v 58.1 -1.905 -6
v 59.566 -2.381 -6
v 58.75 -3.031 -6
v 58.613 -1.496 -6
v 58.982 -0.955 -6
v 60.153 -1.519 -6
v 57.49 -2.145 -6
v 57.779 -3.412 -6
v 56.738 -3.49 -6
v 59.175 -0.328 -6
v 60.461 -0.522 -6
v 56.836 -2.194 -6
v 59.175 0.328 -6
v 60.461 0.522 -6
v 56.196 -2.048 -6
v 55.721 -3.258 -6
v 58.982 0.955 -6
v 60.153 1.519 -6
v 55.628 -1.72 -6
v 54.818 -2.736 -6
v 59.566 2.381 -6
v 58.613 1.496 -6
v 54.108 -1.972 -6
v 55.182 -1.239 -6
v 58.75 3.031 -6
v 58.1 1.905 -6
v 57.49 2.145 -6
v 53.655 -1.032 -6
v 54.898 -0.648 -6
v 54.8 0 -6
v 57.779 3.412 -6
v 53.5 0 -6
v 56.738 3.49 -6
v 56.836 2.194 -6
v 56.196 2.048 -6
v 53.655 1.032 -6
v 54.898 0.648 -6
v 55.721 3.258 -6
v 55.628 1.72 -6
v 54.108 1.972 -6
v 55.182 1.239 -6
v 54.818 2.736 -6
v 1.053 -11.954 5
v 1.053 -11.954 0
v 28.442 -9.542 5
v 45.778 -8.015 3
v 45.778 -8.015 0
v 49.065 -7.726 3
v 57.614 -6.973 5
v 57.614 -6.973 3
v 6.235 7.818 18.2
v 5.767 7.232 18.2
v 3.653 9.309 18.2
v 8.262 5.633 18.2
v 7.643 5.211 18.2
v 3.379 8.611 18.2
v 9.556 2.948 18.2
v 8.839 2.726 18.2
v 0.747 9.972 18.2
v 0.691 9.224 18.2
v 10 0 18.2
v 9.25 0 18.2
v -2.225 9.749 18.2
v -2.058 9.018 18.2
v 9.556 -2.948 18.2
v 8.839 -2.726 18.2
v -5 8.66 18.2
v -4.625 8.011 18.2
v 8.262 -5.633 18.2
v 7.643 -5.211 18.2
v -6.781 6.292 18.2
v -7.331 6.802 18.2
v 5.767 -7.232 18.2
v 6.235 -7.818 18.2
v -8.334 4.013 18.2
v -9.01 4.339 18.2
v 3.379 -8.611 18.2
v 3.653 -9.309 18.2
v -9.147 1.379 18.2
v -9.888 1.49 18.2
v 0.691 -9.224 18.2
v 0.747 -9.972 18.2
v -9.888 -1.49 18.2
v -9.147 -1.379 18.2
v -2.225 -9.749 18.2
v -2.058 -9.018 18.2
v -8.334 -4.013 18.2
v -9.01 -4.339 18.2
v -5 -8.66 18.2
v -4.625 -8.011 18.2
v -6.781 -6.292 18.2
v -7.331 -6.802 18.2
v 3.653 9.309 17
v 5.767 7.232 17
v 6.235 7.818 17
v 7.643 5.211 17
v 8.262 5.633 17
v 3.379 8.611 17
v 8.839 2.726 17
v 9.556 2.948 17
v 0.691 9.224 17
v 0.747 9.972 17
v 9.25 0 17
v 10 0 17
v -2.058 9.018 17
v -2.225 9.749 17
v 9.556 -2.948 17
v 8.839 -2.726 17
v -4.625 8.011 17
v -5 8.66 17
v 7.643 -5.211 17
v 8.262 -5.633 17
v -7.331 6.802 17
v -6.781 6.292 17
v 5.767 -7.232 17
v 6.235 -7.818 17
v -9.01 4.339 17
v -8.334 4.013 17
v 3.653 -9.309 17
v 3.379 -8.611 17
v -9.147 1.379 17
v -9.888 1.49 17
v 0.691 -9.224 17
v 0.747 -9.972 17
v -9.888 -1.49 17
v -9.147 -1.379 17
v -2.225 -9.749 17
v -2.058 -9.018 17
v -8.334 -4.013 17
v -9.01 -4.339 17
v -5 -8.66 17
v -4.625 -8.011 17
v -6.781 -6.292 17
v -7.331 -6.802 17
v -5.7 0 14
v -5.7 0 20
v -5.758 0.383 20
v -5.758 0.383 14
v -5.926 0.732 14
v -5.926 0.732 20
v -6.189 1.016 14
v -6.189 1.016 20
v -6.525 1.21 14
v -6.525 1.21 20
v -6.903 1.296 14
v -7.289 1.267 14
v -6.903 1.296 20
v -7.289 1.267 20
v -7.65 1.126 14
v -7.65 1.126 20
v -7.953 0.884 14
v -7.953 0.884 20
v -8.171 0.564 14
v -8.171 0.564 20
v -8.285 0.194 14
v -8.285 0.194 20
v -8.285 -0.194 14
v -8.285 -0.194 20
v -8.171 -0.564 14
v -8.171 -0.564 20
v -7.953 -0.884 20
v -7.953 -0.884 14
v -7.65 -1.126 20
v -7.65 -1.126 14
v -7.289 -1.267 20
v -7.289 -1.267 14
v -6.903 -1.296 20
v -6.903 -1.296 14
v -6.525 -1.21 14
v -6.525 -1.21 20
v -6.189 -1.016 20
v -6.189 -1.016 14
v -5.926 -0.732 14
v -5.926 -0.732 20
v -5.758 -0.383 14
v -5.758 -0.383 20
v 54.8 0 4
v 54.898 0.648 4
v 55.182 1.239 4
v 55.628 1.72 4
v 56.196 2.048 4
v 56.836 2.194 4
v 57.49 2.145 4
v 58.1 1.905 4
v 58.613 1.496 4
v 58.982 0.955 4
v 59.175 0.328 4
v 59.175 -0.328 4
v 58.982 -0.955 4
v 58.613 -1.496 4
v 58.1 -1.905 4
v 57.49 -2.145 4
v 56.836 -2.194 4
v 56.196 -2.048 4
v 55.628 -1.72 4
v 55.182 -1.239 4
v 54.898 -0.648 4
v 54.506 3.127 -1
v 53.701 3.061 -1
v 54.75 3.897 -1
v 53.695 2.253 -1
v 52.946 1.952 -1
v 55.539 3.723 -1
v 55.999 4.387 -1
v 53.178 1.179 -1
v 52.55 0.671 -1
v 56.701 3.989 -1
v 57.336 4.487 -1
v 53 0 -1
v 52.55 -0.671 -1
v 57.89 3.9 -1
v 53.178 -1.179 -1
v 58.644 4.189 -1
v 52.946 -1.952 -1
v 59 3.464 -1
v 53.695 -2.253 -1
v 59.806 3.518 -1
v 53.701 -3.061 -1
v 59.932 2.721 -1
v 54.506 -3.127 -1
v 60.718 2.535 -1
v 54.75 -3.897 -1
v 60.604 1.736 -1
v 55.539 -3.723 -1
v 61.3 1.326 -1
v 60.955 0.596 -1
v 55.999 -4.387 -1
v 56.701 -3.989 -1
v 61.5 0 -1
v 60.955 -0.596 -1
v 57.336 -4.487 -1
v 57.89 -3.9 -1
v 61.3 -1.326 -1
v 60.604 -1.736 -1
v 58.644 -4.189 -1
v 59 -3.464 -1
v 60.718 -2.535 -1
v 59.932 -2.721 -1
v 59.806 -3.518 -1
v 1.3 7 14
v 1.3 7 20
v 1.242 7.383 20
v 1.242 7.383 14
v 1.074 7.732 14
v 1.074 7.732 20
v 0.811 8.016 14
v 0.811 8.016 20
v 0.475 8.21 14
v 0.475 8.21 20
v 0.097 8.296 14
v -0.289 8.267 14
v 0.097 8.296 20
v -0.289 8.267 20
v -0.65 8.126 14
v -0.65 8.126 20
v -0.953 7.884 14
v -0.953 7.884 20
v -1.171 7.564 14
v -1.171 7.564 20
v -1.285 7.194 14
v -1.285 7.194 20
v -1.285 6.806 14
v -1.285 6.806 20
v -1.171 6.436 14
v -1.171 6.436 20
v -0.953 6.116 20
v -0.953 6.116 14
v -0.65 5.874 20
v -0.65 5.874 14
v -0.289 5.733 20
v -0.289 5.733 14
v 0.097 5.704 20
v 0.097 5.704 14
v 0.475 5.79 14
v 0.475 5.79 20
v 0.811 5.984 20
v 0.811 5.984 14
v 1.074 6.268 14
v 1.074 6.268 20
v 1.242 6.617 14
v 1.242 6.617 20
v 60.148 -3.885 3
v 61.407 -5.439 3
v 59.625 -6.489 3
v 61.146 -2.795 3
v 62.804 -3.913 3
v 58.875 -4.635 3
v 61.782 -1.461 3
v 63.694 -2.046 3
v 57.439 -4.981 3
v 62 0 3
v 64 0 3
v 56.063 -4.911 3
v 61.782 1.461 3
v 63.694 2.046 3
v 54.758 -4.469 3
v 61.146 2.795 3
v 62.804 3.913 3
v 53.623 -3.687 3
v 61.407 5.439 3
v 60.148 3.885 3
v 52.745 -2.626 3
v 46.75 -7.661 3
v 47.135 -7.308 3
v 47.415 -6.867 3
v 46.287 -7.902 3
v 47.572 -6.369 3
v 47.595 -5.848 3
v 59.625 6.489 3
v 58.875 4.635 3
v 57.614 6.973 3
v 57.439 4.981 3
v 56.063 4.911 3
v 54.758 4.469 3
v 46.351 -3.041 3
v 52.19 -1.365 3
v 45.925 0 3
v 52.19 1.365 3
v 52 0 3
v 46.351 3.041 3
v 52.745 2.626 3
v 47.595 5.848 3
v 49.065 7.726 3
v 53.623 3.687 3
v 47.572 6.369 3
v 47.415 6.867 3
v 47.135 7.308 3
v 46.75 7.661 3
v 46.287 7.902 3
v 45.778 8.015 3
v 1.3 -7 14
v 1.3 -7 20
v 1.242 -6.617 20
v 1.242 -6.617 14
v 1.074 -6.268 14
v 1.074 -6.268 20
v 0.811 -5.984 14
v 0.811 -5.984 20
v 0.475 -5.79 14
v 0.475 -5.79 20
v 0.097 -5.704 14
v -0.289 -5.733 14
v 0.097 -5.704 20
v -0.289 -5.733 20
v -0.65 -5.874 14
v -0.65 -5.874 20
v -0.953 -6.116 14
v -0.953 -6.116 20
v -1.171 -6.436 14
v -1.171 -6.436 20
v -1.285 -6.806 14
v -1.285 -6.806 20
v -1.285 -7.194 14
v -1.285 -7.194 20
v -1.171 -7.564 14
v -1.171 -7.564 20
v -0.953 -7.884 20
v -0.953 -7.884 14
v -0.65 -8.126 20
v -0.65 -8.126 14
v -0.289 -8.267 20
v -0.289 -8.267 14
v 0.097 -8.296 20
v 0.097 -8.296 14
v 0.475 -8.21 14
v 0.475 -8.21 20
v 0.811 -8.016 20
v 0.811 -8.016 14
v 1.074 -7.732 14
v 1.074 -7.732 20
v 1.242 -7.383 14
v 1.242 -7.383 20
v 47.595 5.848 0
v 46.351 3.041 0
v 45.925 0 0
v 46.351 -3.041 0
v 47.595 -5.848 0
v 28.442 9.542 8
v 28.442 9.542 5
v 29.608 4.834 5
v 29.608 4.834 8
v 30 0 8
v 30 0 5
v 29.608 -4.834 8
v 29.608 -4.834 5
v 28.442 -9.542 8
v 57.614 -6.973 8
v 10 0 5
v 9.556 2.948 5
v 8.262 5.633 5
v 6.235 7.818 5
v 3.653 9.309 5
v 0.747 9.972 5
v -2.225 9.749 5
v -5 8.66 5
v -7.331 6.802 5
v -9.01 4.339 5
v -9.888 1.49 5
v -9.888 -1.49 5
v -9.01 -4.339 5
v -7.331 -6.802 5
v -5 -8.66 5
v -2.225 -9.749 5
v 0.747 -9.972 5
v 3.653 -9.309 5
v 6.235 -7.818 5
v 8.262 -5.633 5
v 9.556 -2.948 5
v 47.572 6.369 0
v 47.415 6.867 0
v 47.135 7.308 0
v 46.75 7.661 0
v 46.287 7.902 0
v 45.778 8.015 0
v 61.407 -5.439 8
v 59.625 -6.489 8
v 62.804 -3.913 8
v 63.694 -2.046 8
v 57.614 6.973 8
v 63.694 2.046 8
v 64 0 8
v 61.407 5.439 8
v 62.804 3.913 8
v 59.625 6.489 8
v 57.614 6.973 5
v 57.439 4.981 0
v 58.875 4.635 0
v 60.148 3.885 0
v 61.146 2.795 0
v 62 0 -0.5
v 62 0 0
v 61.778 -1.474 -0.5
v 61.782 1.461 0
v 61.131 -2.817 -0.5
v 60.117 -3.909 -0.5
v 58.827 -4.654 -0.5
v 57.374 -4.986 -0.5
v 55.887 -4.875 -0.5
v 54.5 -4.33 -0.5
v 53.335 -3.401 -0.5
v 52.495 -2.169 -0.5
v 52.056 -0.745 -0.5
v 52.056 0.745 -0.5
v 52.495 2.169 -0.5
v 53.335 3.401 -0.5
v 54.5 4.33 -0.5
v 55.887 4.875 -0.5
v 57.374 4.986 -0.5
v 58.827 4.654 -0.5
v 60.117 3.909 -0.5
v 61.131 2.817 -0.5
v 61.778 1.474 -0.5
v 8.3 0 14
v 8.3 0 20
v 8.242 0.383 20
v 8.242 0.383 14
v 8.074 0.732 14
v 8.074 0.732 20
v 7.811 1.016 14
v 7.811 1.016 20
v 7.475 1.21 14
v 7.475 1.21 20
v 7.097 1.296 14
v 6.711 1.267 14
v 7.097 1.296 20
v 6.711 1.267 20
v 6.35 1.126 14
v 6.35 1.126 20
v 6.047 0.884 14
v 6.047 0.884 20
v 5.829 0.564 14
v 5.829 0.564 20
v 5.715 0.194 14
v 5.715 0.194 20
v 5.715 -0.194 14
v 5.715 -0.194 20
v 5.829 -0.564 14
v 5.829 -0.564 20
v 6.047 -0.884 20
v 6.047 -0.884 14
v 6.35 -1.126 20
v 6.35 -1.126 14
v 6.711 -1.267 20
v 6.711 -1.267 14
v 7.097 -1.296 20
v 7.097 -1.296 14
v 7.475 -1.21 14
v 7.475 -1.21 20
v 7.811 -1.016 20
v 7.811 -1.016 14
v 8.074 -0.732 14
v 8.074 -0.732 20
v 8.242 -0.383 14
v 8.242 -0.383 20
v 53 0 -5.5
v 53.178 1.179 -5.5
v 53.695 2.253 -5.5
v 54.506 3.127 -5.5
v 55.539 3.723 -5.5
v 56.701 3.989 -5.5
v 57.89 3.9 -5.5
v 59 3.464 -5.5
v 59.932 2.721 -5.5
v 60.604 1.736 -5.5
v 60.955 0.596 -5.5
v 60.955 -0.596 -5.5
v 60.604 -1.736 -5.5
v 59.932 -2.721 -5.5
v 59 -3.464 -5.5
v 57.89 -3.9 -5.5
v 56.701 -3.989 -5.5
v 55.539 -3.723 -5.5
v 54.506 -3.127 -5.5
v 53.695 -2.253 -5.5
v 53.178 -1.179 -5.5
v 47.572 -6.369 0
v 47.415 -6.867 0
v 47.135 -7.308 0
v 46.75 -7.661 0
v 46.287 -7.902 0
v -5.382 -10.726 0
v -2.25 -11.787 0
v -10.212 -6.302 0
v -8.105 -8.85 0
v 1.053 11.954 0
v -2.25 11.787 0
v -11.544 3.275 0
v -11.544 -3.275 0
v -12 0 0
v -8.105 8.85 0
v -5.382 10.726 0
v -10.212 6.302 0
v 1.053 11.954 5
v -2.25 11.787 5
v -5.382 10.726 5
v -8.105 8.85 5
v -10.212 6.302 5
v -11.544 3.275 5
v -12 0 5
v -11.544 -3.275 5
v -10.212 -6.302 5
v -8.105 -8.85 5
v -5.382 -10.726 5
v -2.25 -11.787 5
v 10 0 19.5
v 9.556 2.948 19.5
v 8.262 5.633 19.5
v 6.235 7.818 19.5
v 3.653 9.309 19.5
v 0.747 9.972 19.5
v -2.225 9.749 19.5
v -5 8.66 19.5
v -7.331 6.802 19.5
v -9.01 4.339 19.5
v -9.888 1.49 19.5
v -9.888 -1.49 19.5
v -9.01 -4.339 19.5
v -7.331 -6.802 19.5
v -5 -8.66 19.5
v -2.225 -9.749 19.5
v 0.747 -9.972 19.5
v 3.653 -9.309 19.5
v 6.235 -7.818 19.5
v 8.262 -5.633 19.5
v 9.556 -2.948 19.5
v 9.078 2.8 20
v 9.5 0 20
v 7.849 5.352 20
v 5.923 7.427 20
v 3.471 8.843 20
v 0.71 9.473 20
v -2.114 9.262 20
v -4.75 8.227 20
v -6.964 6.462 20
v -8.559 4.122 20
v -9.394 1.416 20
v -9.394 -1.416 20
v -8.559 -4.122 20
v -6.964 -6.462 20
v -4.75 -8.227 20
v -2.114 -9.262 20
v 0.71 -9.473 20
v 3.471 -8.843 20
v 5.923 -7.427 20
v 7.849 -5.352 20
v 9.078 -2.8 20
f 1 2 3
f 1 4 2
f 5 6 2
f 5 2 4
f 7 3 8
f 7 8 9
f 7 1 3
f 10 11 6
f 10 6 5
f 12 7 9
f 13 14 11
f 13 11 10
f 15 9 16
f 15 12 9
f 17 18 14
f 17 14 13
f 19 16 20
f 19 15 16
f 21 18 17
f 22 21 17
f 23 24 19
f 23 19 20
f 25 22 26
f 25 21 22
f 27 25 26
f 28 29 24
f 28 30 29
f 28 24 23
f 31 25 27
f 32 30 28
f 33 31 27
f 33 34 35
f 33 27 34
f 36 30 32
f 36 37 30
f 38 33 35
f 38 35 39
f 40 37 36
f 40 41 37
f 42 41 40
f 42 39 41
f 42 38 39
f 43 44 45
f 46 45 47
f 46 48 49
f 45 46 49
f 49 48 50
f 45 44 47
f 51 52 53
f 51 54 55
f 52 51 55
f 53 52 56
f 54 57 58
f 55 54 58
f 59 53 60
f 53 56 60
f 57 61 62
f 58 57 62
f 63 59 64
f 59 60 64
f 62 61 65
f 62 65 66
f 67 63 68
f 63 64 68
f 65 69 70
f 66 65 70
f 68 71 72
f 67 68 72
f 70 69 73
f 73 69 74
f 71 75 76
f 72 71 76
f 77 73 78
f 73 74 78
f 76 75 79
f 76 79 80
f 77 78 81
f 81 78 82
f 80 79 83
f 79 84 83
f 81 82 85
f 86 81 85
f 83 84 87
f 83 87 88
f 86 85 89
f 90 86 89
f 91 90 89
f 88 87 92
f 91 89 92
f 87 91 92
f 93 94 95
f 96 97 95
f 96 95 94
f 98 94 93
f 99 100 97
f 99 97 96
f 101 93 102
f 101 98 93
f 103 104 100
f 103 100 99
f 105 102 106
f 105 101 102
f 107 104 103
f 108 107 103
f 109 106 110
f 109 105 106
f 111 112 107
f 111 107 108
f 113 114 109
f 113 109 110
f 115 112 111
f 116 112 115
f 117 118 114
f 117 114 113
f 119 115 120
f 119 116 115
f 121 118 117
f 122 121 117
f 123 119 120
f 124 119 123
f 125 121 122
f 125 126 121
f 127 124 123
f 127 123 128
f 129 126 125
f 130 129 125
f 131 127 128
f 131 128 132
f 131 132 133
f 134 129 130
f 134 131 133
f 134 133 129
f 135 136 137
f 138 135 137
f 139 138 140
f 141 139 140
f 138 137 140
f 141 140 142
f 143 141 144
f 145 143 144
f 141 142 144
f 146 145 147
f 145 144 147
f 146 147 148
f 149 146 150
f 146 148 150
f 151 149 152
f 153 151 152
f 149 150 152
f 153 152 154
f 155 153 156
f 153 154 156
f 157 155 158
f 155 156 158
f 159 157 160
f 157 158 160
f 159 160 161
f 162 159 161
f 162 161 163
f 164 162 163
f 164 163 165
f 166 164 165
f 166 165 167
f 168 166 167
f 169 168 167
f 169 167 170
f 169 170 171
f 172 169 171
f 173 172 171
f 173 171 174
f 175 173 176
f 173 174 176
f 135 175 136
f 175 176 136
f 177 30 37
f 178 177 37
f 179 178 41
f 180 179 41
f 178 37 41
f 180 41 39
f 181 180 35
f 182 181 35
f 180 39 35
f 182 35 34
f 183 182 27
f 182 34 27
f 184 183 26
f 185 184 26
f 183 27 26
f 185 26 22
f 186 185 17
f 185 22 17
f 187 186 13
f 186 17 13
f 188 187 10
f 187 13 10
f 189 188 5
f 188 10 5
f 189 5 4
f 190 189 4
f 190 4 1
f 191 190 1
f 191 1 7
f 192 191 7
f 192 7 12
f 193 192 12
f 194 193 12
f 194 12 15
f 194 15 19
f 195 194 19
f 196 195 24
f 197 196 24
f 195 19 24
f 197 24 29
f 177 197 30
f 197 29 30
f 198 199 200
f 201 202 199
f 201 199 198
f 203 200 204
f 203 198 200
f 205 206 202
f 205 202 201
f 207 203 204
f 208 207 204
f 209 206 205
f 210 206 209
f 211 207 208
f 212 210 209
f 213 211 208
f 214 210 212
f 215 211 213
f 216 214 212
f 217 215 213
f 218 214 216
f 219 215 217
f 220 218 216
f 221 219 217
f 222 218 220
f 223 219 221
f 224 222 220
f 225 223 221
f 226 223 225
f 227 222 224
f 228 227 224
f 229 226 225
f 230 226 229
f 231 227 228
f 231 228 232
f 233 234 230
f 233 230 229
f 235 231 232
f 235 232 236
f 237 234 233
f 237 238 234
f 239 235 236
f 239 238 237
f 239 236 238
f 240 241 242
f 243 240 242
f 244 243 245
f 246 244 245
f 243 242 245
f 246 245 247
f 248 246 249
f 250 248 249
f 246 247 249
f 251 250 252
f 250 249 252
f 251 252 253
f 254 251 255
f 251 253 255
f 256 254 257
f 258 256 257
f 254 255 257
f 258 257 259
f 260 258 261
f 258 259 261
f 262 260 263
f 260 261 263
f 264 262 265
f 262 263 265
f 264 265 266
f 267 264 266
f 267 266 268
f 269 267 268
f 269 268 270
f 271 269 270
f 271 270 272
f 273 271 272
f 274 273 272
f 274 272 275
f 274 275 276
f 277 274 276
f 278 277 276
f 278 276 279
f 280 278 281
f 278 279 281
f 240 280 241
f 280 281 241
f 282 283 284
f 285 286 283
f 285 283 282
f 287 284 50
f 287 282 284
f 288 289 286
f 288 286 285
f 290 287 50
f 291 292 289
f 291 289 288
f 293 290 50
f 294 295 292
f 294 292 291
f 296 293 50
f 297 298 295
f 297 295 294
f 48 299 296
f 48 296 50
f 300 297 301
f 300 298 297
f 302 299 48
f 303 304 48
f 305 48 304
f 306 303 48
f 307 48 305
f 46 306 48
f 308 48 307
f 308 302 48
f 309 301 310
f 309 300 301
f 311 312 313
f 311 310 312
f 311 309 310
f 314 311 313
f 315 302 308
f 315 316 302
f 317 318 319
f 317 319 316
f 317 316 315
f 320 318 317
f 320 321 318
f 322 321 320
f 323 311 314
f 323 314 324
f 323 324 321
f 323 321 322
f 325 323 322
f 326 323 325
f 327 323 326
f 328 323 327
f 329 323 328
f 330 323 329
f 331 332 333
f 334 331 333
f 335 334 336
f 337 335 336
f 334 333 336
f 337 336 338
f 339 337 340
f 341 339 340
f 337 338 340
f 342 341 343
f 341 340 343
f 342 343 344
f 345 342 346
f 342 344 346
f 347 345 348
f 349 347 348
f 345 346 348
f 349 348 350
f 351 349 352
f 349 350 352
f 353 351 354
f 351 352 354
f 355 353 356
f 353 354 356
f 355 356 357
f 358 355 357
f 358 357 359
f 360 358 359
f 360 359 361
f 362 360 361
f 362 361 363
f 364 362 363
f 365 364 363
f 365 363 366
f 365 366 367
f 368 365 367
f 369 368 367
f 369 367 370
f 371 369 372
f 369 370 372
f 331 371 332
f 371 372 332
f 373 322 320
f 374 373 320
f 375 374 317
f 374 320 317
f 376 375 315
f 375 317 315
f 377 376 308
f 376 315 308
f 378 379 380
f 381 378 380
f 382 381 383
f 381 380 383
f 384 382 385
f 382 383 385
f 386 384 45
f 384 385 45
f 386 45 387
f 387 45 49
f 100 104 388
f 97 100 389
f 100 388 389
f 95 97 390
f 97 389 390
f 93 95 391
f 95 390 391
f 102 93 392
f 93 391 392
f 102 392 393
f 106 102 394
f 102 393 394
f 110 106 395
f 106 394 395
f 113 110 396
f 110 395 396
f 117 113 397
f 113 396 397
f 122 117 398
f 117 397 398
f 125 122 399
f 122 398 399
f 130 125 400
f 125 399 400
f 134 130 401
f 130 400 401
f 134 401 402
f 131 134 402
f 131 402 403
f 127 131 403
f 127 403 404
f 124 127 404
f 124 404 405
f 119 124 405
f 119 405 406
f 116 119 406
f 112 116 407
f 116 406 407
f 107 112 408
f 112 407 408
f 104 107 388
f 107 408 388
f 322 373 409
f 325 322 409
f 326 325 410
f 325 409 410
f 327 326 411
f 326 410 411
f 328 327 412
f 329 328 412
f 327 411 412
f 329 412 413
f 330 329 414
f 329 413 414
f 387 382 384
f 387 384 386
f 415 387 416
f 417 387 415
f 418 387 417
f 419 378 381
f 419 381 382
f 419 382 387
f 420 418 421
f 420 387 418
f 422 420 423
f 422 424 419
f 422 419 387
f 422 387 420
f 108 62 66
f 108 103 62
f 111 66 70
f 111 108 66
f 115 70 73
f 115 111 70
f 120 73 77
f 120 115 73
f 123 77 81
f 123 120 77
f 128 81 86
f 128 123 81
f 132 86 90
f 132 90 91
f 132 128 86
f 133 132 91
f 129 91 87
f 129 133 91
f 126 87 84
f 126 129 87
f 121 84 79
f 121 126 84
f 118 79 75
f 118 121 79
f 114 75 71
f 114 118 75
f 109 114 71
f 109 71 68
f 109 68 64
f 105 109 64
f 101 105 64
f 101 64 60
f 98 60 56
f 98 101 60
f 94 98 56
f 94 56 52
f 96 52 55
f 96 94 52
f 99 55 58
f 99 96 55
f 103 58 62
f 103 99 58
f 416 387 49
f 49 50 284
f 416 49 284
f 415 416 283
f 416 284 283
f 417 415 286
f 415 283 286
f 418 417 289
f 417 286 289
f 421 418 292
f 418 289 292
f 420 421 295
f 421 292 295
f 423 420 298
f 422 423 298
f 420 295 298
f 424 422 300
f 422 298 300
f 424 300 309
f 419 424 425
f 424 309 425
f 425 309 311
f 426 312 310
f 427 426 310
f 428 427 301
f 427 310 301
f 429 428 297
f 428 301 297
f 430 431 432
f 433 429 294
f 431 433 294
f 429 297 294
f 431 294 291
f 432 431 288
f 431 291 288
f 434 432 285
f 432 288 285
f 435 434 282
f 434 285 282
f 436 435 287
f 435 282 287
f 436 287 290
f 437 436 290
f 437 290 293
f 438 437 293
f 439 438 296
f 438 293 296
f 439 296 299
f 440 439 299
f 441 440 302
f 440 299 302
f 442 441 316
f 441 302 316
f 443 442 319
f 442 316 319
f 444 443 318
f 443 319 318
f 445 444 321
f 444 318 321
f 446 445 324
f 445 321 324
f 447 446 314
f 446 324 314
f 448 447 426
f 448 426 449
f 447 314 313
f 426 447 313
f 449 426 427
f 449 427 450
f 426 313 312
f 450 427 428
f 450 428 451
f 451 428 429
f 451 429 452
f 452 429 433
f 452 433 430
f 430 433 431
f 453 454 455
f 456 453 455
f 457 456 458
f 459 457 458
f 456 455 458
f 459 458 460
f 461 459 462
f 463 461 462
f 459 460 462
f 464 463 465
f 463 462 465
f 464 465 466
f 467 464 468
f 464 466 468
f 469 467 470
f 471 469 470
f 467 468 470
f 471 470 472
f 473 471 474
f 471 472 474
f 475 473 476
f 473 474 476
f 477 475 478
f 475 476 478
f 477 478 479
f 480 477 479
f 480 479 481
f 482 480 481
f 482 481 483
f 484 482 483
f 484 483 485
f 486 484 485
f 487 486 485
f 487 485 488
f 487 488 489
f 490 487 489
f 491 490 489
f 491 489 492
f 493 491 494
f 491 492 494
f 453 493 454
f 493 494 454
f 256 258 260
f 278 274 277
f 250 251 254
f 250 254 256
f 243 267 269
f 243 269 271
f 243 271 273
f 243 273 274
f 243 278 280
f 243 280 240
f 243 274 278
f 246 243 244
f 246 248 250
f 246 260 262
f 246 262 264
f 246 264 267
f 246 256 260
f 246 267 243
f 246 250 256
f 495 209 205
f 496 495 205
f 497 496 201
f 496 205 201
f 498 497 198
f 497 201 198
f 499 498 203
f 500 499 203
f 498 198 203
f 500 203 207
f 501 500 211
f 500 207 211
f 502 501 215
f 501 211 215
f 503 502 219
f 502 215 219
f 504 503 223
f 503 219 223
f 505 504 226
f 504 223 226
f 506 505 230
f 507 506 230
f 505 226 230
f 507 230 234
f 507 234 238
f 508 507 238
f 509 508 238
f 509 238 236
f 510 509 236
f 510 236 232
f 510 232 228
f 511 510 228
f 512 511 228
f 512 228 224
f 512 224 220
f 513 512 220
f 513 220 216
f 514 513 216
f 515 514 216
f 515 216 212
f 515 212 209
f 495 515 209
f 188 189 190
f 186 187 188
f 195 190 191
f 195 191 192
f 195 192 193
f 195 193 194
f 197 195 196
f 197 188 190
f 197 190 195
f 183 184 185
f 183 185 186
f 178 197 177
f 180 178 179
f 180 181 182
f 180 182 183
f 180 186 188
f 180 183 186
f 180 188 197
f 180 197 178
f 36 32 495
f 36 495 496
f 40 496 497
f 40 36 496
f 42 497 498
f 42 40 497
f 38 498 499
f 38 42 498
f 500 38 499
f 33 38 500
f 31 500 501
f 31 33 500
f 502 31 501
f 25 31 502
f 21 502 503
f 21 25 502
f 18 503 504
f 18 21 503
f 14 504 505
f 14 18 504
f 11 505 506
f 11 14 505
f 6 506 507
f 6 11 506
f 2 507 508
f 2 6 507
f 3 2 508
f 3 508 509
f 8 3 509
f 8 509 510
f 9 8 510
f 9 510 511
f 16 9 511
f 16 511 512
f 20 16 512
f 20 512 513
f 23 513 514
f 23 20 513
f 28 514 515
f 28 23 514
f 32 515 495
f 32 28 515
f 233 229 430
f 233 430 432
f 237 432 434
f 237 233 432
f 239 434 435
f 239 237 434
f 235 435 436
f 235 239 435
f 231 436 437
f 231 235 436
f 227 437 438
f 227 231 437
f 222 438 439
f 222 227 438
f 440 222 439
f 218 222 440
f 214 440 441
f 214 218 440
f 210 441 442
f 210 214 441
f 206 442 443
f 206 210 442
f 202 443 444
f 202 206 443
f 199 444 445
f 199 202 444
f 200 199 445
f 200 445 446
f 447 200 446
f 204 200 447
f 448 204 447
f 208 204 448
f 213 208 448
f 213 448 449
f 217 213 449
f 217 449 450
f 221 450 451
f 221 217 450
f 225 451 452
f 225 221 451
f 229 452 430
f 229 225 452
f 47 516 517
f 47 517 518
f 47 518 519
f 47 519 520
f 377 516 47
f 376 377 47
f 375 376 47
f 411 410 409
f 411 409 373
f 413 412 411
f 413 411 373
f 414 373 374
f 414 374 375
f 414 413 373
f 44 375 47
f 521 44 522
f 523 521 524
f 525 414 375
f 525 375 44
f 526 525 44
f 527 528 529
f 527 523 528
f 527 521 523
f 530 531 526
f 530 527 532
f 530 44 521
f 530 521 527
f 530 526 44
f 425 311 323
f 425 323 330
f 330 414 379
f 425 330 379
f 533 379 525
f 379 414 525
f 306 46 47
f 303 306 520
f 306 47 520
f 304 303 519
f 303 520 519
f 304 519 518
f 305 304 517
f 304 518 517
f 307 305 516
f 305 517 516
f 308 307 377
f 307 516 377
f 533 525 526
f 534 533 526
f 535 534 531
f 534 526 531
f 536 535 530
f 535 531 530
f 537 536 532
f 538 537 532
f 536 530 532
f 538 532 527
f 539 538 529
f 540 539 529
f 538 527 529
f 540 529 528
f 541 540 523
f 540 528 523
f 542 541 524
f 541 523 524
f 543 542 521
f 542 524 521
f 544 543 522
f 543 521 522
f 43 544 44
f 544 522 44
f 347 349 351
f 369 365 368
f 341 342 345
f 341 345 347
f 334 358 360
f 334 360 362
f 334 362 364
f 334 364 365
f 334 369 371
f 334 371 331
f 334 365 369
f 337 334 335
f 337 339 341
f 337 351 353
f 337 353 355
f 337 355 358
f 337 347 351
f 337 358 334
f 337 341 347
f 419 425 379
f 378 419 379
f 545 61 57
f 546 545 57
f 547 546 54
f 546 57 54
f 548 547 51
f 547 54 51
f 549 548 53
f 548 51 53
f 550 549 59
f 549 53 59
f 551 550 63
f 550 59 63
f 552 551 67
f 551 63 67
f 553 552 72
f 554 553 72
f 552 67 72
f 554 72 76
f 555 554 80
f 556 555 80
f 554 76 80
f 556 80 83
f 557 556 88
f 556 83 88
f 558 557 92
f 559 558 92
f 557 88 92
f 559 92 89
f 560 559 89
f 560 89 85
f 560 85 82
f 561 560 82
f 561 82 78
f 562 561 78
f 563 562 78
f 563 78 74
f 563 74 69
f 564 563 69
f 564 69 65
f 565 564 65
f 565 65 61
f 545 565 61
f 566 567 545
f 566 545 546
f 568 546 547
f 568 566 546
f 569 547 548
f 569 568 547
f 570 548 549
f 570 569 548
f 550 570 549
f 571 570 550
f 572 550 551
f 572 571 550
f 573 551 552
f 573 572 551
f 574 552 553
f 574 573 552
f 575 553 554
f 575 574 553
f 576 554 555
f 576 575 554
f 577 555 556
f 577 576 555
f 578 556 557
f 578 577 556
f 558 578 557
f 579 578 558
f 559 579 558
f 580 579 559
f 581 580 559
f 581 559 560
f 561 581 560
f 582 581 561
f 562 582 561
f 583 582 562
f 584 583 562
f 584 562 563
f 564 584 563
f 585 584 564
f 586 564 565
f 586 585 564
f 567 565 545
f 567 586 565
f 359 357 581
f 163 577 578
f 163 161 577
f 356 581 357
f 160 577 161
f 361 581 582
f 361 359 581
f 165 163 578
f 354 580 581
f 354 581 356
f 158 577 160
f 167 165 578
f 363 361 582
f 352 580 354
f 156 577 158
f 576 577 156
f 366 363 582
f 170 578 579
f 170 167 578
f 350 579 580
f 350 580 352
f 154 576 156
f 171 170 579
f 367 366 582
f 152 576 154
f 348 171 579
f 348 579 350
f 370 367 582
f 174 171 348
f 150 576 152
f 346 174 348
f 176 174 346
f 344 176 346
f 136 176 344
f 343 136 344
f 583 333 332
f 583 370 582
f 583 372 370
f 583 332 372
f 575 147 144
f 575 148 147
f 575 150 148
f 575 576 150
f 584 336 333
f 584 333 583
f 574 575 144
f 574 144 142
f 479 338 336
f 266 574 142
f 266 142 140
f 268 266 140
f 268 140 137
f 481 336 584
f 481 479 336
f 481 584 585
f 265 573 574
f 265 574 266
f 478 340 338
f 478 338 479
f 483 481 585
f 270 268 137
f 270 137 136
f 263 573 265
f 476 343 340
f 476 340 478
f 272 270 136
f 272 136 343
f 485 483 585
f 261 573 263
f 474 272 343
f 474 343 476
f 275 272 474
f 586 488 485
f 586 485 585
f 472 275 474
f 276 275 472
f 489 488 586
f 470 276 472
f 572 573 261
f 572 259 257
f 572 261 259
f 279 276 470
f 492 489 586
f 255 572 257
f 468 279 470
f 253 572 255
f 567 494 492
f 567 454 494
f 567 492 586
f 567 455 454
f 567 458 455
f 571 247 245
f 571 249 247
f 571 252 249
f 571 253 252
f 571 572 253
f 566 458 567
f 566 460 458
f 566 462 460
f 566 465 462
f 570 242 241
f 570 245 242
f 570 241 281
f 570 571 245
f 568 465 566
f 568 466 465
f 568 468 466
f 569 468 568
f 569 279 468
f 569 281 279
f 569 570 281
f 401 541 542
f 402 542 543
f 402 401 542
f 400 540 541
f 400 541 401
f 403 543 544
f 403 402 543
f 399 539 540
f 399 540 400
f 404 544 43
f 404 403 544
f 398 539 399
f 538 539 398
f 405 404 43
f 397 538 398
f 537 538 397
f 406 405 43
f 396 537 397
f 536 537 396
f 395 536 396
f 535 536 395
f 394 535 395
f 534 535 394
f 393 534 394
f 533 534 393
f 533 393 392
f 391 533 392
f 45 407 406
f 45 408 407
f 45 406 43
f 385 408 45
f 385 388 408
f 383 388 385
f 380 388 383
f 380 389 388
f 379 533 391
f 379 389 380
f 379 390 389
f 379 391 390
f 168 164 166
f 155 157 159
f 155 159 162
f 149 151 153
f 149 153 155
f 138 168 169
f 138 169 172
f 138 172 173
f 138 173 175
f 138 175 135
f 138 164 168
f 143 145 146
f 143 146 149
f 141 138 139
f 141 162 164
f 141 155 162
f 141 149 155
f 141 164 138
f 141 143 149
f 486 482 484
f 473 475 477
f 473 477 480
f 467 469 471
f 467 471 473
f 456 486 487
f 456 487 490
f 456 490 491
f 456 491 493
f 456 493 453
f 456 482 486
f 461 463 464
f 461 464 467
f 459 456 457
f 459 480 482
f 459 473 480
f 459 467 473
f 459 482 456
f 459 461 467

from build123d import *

# Parameters (mm, degrees)
EXTRUDE_1_DEPTH     = 5
SKETCH_2_R          = 10
EXTRUDE_2_DEPTH     = 15
SKETCH_3_R          = 4
EXTRUDE_3_DEPTH     = 6
SKETCH_4_R          = 5
SKETCH_4_R_2        = 4
EXTRUDE_4_DEPTH     = 1
CHAMFER_1_SIZE      = 0.5
SKETCH_6_R          = 1.3
CUT_EXTRUDE_2_DEPTH = 6
SKETCH_11_R         = 2.2
CUT_EXTRUDE_7_DEPTH = 10
CUT_EXTRUDE_START   = -5
CUT_EXTRUDE_8_DEPTH = 5
CUT_EXTRUDE_START_2 = -3
SKETCH_14_R         = 11.075
SKETCH_14_R_2       = 5
CUT_EXTRUDE_9_DEPTH = 3
EXTRUDE_START       = -1
EXTRUDE_5_DEPTH     = 1
FILLET_1_R          = 2
SKETCH_16_W         = 4.663078912
SKETCH_16_H         = 1.2
EXTRUDE_6_DEPTH     = 4
EXTRUDE_7_DEPTH     = 1
EXTRUDE_8_DEPTH     = 3


with BuildPart() as part:
    # 草图1 → 凸台-拉伸1 (new body)
    with BuildSketch(Plane.XY):
        with BuildLine():
            Line((57.614035088, 6.973016629), (1.052631579, 11.953742793))
            ThreePointArc((1.052631579, 11.953742793), (-12, 0), (1.052631579, -11.953742793))
            Line((1.052631579, -11.953742793), (57.614035088, -6.973016629))
            ThreePointArc((57.614035088, -6.973016629), (64, 0), (57.614035088, 6.973016629))
        make_face()
    extrude(amount=EXTRUDE_1_DEPTH)

    # 草图2 → 凸台-拉伸2 (add)
    with BuildSketch(Plane.XY.offset(5)):
        Circle(SKETCH_2_R)
    extrude(amount=EXTRUDE_2_DEPTH)

    # 草图3 → 凸台-拉伸3 (add)
    with BuildSketch(Plane(origin=(0, 0, 0), x_dir=(-1, 0, 0), z_dir=(0, 0, -1))):
        with Locations((-57, 0)):
            Circle(SKETCH_3_R)
    extrude(amount=EXTRUDE_3_DEPTH)

    # 草图4 → 凸台-拉伸4 (add)
    with BuildSketch(Plane(origin=(0, 0, 0), x_dir=(-1, 0, 0), z_dir=(0, 0, -1))):
        with Locations(Location((-57, 0, 0), (0, 0, 180))):
            Circle(SKETCH_4_R)
        with Locations((-57, 0)):
            Circle(SKETCH_4_R_2, mode=Mode.SUBTRACT)
    extrude(amount=EXTRUDE_4_DEPTH)

    # 倒角1
    chamfer_1_edges = [part.edges().sort_by_distance(p)[0] for p in [
        (-10, 0, 20),
        (61, 0, -6),
        (52, 0, -1),
    ]]
    chamfer(chamfer_1_edges, length=CHAMFER_1_SIZE)

    # 草图6 → 切除-拉伸2 (cut)
    with BuildSketch(Plane.XY.offset(20)):
        with Locations((0, 7)):
            Circle(SKETCH_6_R)
        with Locations((7, 0)):
            Circle(SKETCH_6_R)
        with Locations((0, -7)):
            Circle(SKETCH_6_R)
        with Locations((-7, 0)):
            Circle(SKETCH_6_R)
    extrude(amount=-CUT_EXTRUDE_2_DEPTH, mode=Mode.SUBTRACT)

    # 草图11 → 切除-拉伸7 (cut)
    with BuildSketch(Plane(origin=(0, 0, -6), x_dir=(-1, 0, 0), z_dir=(0, 0, -1))):
        with Locations((-57, 0)):
            Circle(SKETCH_11_R)
    extrude(amount=-CUT_EXTRUDE_7_DEPTH, mode=Mode.SUBTRACT)

    # 草图12 → 切除-拉伸8 (cut)
    with BuildSketch(Plane.XY.offset(5).offset(CUT_EXTRUDE_START)):
        with BuildLine():
            Line((57.438596491, 4.980726164), (7.48487293, 9.379588329))
            ThreePointArc((7.48487293, 9.379588329), (10.812457518, 5.204878713), (12, 0))
            ThreePointArc((12, 0), (10.812457518, -5.204878713), (7.48487293, -9.379588329))
            Line((7.48487293, -9.379588329), (57.438596491, -4.980726164))
            ThreePointArc((57.438596491, -4.980726164), (52, 0), (57.438596491, 4.980726164))
        make_face()
    extrude(amount=CUT_EXTRUDE_8_DEPTH, mode=Mode.SUBTRACT)

    # 草图14 → 切除-拉伸9 (cut)
    with BuildSketch(Plane(origin=(0, 0, 0), x_dir=(-1, 0, 0), z_dir=(0, 0, -1)).offset(CUT_EXTRUDE_START_2)):
        with Locations((-57, 0)):
            Circle(SKETCH_14_R)
        with Locations(Location((-57, 0, 0), (0, 0, 95.032413496))):
            Circle(SKETCH_14_R_2, mode=Mode.SUBTRACT)
    extrude(amount=CUT_EXTRUDE_9_DEPTH, mode=Mode.SUBTRACT)

    # 草图15 → 凸台-拉伸5 (add)
    with BuildSketch(Plane.XY.offset(5).offset(EXTRUDE_START)):
        with BuildLine():
            Line((1.052631579, -11.953742793), (57.614035088, -6.973016629))
            ThreePointArc((57.614035088, -6.973016629), (64, 0), (57.614035088, 6.973016629))
            Line((57.614035088, 6.973016629), (1.052631579, 11.953742793))
            ThreePointArc((1.052631579, 11.953742793), (-12, 0), (1.052631579, -11.953742793))
        make_face()
    extrude(amount=EXTRUDE_5_DEPTH)

    # 圆角1
    # the kernel refuses this fillet: 2 mm, written as the material it takes off along each edge
    with BuildSketch(Plane(origin=(49.064832266, -7.725848694, -8.249501326), x_dir=(-0.6163800221199659, 0.7874488353736963, 0), z_dir=(0, 0, 1))) as fillet_1_piece_1:
        with BuildLine():
            CenterArc((3.475122508, 1.676963653), FILLET_1_R, 146.980149767, 90)
            Line((1.798158856, 2.766822775), (0, 0))
            ThreePointArc((0, 0), (1.192631693, 0.064402621), (2.385263386, 0))
        make_face()
    extrude(amount=11.249501326, mode=Mode.SUBTRACT)
    with BuildSketch(Plane(origin=(49.064832266, 7.725848694, -8.249501326), x_dir=(-0.9961452327423431, 0.08771929824561424, 0), z_dir=(0, 0, 1))) as fillet_1_piece_2:
        with BuildLine():
            CenterArc((3.29980053, 2), FILLET_1_R, 180, 90)
            ThreePointArc((1.29980053, 2), (0.703900692, 0.964905108), (0, 0))
            Line((0, 0), (3.29980053, 0))
        make_face()
    extrude(amount=11.249501326, mode=Mode.SUBTRACT)

    # 草图16 → 切除-旋转1 (revolve, cut)
    with BuildSketch(Plane(origin=(0, 0, 0), x_dir=(1, 0, 0), z_dir=(0, 1, 0))):
        with Locations((11.581539456, -17.6)):
            Rectangle(SKETCH_16_W, SKETCH_16_H)
    revolve(axis=Axis((0, 0, 20), (0, 0, -1)), mode=Mode.SUBTRACT)

    # 草图17 → 凸台-拉伸6 (add)
    # profile 1 of 2: a face of its own
    with BuildSketch(Plane(origin=(0, 0, 4), x_dir=(-1, 0, 0), z_dir=(0, 0, -1))):
        with BuildLine():
            ThreePointArc((-7.48487293, -9.379588329), (-12, 0), (-7.48487293, 9.379588329))
            Line((-7.48487293, 9.379588329), (-47.594603568, 5.847575819))
            ThreePointArc((-47.594603568, 5.847575819), (-45.925, 0), (-47.594603568, -5.847575819))
            Line((-47.594603568, -5.847575819), (-7.48487293, -9.379588329))
        make_face()
        with BuildLine():
            Line((-43.563456974, -2.155807668), (-43.563456974, 2.155807668))
            Line((-43.563456974, 2.155807668), (-15.344753505, 4.640711258))
            ThreePointArc((-15.344753505, 4.640711258), (-16.031146594, 0), (-15.344753505, -4.640711258))
            Line((-15.344753505, -4.640711258), (-43.563456974, -2.155807668))
        make_face(mode=Mode.SUBTRACT)
    # profile 2 of 2: a face of its own
    with BuildSketch(Plane(origin=(0, 0, 4), x_dir=(-1, 0, 0), z_dir=(0, 0, -1))):
        with BuildLine():
            ThreePointArc((-15.344753505, 4.640711258), (-16.031146594, 0), (-15.344753505, -4.640711258))
            Line((-15.344753505, -4.640711258), (-43.563456974, -2.155807668))
            Line((-43.563456974, -2.155807668), (-43.563456974, 2.155807668))
            Line((-43.563456974, 2.155807668), (-15.344753505, 4.640711258))
        make_face()
    extrude(amount=EXTRUDE_6_DEPTH)

    # 草图18 → 凸台-拉伸7 (add)
    with BuildSketch(Plane(origin=(0, 0, 4), x_dir=(-1, 0, 0), z_dir=(0, 0, -1))):
        with BuildLine():
            Line((-47.594603568, 5.847575819), (-57.438596491, 4.980726164))
            ThreePointArc((-57.438596491, 4.980726164), (-52, 0), (-57.438596491, -4.980726164))
            Line((-57.438596491, -4.980726164), (-47.594603568, -5.847575819))
            ThreePointArc((-47.594603568, -5.847575819), (-45.925, 0), (-47.594603568, 5.847575819))
        make_face()
    extrude(amount=EXTRUDE_7_DEPTH)

    # 草图19 → 凸台-拉伸8 (add)
    with BuildSketch(Plane.XY.offset(5)):
        with BuildLine():
            Line((28.442097172, -9.541860848), (57.614035088, -6.973016629))
            ThreePointArc((57.614035088, -6.973016629), (64, 0), (57.614035088, 6.973016629))
            Line((57.614035088, 6.973016629), (28.442097172, 9.541860848))
            ThreePointArc((28.442097172, 9.541860848), (30, 0), (28.442097172, -9.541860848))
        make_face()
    extrude(amount=EXTRUDE_8_DEPTH)


solid = part.part
